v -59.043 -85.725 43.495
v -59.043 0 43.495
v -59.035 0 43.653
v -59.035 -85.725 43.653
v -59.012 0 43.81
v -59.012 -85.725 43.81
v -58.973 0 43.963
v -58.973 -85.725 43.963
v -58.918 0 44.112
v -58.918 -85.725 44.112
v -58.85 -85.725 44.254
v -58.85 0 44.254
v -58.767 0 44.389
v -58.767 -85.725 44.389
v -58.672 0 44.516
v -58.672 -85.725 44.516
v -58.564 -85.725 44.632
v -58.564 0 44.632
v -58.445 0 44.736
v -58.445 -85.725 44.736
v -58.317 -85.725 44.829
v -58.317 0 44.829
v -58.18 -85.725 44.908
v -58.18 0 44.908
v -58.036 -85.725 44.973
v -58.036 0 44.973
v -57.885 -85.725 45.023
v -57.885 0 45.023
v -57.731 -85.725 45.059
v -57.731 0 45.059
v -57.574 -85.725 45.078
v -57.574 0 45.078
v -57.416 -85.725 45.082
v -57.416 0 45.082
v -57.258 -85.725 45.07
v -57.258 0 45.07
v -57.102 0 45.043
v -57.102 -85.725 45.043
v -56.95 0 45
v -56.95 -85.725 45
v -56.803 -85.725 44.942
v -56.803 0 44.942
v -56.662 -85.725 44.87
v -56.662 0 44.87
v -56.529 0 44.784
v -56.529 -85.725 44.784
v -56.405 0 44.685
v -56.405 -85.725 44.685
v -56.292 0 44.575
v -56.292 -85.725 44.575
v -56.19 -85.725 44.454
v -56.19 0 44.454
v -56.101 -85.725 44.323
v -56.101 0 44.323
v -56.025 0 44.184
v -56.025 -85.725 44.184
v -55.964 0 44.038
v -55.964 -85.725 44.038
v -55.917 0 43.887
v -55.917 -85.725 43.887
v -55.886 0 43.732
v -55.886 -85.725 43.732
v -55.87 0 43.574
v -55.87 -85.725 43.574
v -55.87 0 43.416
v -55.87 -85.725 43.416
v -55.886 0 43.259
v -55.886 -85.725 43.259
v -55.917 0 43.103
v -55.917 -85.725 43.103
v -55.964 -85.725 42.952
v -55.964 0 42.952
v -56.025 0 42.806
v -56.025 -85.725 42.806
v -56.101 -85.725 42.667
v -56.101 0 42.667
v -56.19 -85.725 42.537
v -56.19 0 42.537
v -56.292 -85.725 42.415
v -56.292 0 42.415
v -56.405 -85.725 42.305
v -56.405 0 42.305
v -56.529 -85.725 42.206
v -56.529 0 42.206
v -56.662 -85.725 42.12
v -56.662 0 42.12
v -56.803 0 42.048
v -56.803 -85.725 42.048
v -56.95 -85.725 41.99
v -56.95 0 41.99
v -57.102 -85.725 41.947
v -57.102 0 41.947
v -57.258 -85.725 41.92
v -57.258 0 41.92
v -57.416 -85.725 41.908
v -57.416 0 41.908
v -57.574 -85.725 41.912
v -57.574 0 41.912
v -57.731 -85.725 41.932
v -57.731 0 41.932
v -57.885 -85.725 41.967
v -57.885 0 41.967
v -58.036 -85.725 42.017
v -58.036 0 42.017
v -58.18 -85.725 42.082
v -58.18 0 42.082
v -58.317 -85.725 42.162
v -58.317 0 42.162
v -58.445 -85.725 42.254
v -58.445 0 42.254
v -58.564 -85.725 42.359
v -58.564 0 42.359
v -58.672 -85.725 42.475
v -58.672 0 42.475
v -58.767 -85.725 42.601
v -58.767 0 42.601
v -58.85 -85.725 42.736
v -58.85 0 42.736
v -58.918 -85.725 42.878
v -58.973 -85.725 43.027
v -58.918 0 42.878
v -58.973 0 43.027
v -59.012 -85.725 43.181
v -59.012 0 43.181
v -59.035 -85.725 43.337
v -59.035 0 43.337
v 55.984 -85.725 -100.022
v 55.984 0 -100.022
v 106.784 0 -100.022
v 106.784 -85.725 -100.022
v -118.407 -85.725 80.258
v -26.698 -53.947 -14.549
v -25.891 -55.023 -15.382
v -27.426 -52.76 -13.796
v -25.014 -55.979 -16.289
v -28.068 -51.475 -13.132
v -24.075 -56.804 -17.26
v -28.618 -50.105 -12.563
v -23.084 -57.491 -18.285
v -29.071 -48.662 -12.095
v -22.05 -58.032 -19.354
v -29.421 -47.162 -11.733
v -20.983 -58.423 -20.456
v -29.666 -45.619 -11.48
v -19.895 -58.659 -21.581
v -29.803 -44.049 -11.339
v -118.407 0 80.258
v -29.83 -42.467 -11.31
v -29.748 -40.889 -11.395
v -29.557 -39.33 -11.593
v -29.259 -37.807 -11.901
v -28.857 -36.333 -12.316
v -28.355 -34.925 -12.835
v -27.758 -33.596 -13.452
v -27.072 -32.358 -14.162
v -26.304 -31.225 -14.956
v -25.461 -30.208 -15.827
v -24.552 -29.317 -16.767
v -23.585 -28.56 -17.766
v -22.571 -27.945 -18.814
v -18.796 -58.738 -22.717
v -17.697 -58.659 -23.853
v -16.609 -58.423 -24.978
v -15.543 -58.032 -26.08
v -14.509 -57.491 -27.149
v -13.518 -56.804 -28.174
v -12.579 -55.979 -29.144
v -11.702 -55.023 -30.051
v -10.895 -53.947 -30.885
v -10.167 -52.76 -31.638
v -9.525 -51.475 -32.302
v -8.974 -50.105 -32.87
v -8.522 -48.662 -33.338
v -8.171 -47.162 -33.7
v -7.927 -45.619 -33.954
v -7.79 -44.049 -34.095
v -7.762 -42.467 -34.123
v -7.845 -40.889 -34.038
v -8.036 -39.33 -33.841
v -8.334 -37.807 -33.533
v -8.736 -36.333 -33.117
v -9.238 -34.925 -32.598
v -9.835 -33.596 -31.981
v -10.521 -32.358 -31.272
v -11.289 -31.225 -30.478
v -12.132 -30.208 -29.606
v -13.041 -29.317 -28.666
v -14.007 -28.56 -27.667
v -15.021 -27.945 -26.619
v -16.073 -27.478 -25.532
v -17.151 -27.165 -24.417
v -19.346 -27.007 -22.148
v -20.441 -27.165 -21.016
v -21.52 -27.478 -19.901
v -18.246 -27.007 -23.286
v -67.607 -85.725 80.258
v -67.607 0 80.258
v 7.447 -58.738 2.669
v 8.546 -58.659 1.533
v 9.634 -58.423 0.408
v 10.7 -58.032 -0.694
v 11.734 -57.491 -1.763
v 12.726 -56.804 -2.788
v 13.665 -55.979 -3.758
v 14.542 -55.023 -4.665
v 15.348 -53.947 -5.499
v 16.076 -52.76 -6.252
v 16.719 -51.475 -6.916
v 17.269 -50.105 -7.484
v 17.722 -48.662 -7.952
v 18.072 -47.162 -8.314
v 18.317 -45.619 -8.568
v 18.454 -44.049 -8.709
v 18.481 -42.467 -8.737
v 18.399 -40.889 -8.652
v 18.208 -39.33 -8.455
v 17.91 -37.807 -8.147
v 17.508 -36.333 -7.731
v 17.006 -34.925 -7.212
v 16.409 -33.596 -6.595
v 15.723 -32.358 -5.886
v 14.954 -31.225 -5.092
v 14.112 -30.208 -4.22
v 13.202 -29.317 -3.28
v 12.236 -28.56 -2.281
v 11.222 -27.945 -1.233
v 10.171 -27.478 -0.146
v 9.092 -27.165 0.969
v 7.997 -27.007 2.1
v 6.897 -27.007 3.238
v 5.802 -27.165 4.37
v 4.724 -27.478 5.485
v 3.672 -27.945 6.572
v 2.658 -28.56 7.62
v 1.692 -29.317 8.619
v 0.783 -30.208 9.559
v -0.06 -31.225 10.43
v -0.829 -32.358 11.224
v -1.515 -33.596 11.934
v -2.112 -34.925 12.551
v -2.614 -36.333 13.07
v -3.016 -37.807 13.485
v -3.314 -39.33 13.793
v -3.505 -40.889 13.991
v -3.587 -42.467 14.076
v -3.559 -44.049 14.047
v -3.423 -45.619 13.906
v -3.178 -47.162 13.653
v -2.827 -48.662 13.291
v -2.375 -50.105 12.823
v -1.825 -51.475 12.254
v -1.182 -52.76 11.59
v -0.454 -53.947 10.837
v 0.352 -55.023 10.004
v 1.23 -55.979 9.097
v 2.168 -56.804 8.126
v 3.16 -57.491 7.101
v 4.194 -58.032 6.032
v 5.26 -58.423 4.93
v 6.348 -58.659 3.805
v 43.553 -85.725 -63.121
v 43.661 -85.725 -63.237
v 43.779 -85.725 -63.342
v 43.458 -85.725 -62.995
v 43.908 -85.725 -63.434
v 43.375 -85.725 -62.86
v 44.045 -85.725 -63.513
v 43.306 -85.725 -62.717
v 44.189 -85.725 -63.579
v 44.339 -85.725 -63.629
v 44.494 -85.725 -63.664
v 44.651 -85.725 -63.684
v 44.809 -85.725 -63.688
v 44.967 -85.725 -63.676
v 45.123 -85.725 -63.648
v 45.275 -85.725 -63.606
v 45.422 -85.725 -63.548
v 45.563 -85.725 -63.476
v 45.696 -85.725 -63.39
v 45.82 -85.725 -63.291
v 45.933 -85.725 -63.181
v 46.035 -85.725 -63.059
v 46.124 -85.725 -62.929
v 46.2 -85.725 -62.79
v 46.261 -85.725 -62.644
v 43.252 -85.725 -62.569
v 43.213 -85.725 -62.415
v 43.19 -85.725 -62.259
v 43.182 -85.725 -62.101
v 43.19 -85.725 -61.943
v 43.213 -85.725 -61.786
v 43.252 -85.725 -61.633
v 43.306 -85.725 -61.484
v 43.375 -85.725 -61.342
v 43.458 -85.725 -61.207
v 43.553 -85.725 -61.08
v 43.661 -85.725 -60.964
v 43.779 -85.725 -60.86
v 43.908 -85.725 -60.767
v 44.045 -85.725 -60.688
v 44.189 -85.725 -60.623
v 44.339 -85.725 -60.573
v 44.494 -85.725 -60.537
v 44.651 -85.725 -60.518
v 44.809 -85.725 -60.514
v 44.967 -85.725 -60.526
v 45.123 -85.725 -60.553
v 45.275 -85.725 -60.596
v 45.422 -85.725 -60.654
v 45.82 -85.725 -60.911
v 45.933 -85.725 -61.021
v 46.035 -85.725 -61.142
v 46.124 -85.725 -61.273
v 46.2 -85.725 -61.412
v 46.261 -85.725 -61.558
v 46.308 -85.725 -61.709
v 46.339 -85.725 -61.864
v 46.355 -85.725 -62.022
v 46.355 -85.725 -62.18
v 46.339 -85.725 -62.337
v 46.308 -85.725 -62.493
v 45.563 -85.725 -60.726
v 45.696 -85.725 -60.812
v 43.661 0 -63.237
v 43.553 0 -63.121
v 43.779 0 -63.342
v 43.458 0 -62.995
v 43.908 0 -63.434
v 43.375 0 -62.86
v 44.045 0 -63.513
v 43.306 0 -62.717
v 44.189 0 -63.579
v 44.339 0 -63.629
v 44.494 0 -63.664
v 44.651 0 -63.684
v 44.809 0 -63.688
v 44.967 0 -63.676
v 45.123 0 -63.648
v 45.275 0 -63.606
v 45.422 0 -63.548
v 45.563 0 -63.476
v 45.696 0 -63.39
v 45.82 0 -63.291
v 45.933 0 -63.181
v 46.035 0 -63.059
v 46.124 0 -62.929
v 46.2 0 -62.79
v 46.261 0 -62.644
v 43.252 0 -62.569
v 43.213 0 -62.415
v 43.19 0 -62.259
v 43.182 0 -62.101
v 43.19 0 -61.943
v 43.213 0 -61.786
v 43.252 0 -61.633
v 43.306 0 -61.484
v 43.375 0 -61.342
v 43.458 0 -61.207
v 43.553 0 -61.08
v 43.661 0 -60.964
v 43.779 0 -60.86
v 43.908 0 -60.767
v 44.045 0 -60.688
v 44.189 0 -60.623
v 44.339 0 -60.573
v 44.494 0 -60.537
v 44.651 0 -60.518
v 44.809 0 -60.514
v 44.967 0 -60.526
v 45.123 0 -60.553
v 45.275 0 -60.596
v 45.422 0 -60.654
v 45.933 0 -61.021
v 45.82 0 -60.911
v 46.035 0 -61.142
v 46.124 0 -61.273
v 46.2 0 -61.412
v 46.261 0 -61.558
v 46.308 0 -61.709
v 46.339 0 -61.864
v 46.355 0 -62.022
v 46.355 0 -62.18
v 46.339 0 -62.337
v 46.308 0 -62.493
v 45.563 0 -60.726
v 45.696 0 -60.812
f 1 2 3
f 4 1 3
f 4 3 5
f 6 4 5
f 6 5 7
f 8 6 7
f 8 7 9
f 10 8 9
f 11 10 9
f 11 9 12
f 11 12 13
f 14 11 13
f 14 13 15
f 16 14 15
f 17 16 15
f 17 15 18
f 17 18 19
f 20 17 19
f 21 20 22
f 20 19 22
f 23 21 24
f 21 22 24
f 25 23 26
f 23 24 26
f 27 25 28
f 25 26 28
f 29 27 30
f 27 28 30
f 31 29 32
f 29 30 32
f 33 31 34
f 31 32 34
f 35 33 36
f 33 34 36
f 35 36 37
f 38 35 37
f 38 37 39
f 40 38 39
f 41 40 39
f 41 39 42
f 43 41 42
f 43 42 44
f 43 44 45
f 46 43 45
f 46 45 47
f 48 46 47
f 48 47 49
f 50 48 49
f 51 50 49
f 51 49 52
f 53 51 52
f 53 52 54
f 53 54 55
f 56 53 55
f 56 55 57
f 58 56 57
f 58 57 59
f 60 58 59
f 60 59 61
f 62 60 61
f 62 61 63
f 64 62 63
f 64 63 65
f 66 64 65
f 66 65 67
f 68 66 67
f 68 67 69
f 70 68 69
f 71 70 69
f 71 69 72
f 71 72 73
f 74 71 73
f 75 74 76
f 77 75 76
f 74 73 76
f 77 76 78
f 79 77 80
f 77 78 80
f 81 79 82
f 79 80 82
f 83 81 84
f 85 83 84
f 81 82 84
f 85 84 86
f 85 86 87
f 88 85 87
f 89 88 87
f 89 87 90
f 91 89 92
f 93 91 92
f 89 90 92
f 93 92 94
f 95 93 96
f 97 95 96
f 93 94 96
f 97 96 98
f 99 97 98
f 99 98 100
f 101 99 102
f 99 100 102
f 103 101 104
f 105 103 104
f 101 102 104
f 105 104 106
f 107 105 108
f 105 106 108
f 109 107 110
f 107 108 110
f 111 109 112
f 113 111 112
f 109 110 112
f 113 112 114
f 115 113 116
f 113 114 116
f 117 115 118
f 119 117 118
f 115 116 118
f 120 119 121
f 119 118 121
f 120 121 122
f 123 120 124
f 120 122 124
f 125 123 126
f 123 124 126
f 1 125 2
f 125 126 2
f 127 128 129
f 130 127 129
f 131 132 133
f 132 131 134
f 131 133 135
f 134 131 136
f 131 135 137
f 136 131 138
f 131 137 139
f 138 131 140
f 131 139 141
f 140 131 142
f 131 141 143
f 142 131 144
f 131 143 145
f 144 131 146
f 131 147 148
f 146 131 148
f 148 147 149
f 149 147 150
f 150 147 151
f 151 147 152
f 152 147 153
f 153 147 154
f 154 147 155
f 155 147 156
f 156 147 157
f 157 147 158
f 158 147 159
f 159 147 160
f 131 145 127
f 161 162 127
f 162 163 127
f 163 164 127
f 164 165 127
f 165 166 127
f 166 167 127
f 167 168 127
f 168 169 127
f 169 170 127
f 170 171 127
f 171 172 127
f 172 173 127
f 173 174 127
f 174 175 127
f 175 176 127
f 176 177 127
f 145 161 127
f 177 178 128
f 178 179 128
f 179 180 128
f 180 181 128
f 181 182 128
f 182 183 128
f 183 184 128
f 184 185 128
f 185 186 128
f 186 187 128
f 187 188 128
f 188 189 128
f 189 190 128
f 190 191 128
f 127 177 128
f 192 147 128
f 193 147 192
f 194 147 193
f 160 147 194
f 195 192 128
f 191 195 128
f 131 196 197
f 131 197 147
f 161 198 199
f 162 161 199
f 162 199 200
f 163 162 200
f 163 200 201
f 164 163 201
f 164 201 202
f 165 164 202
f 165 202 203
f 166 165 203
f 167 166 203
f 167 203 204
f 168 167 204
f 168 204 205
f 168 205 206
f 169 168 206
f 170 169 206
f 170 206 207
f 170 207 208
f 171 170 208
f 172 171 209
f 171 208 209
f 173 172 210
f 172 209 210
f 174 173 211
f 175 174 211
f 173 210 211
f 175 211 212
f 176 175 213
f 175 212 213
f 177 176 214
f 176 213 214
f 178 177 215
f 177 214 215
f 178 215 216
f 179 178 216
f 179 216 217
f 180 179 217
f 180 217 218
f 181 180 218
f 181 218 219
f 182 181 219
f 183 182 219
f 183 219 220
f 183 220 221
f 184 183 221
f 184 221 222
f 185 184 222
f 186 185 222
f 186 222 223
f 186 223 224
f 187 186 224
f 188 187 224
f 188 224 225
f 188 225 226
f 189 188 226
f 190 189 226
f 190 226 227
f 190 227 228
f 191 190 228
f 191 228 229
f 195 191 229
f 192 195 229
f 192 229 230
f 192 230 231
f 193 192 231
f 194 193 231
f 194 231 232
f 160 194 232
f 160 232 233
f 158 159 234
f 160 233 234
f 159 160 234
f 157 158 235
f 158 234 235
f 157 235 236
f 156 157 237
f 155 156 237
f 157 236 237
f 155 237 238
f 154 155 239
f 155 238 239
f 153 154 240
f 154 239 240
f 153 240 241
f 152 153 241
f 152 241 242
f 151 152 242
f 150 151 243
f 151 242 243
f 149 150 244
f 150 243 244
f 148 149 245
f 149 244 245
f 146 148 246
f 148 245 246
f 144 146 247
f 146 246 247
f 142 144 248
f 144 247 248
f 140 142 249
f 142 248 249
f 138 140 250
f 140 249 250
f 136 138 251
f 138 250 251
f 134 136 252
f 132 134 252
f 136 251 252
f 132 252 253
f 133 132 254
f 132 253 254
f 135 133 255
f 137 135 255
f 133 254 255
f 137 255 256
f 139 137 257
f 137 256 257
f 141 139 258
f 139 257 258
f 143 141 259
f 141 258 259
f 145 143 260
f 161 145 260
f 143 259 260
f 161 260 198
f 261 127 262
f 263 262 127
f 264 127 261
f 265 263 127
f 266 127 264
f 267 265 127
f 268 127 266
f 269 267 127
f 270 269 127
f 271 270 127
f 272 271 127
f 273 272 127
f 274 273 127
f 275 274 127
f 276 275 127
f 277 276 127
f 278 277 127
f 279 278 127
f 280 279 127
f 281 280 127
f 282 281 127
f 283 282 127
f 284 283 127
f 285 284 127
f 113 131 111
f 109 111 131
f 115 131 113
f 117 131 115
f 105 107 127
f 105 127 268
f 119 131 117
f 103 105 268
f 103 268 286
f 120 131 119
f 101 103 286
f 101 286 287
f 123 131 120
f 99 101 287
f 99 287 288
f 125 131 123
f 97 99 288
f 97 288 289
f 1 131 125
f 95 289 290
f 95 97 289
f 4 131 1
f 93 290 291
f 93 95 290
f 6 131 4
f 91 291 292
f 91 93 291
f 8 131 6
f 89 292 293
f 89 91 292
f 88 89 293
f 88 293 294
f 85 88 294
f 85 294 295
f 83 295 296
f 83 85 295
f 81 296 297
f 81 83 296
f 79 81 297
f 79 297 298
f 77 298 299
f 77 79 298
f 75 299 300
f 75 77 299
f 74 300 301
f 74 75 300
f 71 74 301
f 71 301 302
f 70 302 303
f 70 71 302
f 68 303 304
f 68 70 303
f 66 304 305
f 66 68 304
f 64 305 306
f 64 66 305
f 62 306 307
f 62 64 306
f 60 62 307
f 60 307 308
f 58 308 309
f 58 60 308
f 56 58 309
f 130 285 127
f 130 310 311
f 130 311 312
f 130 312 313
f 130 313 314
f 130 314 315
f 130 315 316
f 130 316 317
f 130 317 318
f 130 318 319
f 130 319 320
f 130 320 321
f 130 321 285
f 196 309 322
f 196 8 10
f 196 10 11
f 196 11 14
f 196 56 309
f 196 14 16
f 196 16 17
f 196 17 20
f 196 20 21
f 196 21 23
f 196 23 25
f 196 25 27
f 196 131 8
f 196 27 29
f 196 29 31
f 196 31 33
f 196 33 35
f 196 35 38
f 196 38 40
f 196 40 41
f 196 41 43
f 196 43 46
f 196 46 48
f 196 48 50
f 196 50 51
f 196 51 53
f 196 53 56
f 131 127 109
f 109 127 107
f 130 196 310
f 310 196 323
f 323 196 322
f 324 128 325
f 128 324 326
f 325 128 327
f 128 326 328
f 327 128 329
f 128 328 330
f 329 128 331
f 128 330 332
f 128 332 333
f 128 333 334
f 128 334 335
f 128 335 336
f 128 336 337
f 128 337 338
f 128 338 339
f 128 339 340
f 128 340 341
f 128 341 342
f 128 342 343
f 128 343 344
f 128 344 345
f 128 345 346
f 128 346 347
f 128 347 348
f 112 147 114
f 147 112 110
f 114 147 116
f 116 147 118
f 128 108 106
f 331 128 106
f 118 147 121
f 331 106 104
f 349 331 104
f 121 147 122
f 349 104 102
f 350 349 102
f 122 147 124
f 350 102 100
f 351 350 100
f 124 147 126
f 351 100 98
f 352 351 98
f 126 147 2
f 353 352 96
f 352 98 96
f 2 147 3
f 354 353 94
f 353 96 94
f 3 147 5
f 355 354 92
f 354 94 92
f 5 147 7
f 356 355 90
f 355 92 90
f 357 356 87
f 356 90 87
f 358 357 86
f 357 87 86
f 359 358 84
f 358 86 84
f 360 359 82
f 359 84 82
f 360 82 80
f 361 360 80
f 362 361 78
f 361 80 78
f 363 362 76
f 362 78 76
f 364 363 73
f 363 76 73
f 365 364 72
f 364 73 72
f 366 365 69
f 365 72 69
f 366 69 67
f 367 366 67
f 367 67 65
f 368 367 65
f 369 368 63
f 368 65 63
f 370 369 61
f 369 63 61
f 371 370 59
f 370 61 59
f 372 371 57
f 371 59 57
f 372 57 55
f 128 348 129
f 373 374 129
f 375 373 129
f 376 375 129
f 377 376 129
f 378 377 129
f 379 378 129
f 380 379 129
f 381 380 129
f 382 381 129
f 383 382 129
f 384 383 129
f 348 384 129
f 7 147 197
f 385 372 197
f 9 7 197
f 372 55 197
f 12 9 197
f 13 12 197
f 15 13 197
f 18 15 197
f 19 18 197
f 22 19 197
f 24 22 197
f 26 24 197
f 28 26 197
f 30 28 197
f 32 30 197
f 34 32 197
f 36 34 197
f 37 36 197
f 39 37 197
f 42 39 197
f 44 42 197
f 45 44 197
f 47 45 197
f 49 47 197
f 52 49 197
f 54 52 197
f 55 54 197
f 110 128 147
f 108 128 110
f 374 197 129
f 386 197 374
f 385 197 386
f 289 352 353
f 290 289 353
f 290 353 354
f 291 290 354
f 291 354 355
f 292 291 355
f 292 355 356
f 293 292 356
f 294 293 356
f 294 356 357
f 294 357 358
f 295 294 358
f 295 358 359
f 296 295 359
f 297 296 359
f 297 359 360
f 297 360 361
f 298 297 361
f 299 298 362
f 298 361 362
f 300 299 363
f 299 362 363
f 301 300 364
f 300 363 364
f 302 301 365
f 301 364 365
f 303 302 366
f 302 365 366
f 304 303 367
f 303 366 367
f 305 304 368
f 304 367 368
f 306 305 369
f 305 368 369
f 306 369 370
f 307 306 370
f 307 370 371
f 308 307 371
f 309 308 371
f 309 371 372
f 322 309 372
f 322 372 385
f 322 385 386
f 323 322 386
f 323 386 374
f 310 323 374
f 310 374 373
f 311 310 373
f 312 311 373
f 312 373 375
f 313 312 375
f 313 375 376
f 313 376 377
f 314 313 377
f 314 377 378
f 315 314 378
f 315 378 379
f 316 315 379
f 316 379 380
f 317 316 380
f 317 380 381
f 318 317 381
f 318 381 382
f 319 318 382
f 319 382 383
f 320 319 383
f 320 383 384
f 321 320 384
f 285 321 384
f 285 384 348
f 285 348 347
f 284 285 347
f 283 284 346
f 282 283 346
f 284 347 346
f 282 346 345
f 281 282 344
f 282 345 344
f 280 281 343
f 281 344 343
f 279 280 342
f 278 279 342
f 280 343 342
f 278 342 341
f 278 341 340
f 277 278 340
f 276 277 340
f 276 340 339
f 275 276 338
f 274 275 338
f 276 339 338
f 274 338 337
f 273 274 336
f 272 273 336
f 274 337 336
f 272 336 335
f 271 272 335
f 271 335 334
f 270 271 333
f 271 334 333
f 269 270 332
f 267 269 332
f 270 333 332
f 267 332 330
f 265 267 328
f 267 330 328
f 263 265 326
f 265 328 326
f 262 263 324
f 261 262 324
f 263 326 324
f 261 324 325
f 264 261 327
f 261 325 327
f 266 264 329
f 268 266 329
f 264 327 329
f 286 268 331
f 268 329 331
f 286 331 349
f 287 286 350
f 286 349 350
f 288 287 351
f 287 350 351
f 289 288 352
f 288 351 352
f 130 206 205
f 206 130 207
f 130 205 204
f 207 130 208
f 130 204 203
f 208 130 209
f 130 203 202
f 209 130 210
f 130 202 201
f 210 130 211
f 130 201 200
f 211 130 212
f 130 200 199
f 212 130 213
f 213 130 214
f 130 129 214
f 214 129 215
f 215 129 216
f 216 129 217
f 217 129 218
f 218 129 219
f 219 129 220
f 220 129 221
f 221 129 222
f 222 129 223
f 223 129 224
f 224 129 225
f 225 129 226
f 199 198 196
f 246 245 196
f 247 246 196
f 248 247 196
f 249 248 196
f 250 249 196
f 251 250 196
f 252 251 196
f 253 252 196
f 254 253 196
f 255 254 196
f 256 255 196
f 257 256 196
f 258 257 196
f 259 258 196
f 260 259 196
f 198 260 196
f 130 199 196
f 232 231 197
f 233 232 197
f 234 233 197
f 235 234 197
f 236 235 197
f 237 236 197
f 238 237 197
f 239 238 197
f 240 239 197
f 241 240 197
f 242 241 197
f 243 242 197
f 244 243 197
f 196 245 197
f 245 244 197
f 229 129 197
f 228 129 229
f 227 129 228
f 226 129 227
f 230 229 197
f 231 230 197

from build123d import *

# Parameters (mm, degrees)
F1_DEPTH = 85.725
F3_DEPTH = 50.8
F4_R     = 1.5875
F5_DEPTH = 127


with BuildPart() as f1:
    # F0 (on Front) → F1 (new body)
    with BuildSketch(Plane.XZ):
        Polygon((-67.6071290719, 80.2582807616), (-118.4071290719, 80.2582807616), (55.9836195711, -100.0221879884), (106.7836195711, -100.0221879884), align=None)
    extrude(amount=F1_DEPTH)

    # F2 (on face) → F3 (cut)
    with BuildSketch(Plane(origin=(5.1810656307, 0, 5.0118014468), x_dir=(0, 1, 0), z_dir=(0.71875, 0, 0.6952686082))):
        with BuildLine():
            Line((-58.7375, -3.2592461708), (-26.9875, -3.2592461708))
            ThreePointArc((-26.9875, -3.2592461708), (-42.8625, 12.6157538292), (-58.7375, -3.2592461708))
        make_face()
        with BuildLine():
            ThreePointArc((-58.7375, -3.2592461708), (-42.8625, -19.1342461708), (-26.9875, -3.2592461708))
            Line((-26.9875, -3.2592461708), (-58.7375, -3.2592461708))
        make_face()
    extrude(amount=-F3_DEPTH, mode=Mode.SUBTRACT)

    # F4 (on face) → F5 (cut)
    with BuildSketch(Plane(origin=(0, 0, 0), x_dir=(-1, 0, 0), z_dir=(0, 1, 0))):
        with Locations((-44.76928715, -62.1007793102)):
            Circle(F4_R)
        with Locations((57.455530428, 43.4951331483)):
            Circle(F4_R)
    extrude(amount=-F5_DEPTH, mode=Mode.SUBTRACT)


solid = f1.part
